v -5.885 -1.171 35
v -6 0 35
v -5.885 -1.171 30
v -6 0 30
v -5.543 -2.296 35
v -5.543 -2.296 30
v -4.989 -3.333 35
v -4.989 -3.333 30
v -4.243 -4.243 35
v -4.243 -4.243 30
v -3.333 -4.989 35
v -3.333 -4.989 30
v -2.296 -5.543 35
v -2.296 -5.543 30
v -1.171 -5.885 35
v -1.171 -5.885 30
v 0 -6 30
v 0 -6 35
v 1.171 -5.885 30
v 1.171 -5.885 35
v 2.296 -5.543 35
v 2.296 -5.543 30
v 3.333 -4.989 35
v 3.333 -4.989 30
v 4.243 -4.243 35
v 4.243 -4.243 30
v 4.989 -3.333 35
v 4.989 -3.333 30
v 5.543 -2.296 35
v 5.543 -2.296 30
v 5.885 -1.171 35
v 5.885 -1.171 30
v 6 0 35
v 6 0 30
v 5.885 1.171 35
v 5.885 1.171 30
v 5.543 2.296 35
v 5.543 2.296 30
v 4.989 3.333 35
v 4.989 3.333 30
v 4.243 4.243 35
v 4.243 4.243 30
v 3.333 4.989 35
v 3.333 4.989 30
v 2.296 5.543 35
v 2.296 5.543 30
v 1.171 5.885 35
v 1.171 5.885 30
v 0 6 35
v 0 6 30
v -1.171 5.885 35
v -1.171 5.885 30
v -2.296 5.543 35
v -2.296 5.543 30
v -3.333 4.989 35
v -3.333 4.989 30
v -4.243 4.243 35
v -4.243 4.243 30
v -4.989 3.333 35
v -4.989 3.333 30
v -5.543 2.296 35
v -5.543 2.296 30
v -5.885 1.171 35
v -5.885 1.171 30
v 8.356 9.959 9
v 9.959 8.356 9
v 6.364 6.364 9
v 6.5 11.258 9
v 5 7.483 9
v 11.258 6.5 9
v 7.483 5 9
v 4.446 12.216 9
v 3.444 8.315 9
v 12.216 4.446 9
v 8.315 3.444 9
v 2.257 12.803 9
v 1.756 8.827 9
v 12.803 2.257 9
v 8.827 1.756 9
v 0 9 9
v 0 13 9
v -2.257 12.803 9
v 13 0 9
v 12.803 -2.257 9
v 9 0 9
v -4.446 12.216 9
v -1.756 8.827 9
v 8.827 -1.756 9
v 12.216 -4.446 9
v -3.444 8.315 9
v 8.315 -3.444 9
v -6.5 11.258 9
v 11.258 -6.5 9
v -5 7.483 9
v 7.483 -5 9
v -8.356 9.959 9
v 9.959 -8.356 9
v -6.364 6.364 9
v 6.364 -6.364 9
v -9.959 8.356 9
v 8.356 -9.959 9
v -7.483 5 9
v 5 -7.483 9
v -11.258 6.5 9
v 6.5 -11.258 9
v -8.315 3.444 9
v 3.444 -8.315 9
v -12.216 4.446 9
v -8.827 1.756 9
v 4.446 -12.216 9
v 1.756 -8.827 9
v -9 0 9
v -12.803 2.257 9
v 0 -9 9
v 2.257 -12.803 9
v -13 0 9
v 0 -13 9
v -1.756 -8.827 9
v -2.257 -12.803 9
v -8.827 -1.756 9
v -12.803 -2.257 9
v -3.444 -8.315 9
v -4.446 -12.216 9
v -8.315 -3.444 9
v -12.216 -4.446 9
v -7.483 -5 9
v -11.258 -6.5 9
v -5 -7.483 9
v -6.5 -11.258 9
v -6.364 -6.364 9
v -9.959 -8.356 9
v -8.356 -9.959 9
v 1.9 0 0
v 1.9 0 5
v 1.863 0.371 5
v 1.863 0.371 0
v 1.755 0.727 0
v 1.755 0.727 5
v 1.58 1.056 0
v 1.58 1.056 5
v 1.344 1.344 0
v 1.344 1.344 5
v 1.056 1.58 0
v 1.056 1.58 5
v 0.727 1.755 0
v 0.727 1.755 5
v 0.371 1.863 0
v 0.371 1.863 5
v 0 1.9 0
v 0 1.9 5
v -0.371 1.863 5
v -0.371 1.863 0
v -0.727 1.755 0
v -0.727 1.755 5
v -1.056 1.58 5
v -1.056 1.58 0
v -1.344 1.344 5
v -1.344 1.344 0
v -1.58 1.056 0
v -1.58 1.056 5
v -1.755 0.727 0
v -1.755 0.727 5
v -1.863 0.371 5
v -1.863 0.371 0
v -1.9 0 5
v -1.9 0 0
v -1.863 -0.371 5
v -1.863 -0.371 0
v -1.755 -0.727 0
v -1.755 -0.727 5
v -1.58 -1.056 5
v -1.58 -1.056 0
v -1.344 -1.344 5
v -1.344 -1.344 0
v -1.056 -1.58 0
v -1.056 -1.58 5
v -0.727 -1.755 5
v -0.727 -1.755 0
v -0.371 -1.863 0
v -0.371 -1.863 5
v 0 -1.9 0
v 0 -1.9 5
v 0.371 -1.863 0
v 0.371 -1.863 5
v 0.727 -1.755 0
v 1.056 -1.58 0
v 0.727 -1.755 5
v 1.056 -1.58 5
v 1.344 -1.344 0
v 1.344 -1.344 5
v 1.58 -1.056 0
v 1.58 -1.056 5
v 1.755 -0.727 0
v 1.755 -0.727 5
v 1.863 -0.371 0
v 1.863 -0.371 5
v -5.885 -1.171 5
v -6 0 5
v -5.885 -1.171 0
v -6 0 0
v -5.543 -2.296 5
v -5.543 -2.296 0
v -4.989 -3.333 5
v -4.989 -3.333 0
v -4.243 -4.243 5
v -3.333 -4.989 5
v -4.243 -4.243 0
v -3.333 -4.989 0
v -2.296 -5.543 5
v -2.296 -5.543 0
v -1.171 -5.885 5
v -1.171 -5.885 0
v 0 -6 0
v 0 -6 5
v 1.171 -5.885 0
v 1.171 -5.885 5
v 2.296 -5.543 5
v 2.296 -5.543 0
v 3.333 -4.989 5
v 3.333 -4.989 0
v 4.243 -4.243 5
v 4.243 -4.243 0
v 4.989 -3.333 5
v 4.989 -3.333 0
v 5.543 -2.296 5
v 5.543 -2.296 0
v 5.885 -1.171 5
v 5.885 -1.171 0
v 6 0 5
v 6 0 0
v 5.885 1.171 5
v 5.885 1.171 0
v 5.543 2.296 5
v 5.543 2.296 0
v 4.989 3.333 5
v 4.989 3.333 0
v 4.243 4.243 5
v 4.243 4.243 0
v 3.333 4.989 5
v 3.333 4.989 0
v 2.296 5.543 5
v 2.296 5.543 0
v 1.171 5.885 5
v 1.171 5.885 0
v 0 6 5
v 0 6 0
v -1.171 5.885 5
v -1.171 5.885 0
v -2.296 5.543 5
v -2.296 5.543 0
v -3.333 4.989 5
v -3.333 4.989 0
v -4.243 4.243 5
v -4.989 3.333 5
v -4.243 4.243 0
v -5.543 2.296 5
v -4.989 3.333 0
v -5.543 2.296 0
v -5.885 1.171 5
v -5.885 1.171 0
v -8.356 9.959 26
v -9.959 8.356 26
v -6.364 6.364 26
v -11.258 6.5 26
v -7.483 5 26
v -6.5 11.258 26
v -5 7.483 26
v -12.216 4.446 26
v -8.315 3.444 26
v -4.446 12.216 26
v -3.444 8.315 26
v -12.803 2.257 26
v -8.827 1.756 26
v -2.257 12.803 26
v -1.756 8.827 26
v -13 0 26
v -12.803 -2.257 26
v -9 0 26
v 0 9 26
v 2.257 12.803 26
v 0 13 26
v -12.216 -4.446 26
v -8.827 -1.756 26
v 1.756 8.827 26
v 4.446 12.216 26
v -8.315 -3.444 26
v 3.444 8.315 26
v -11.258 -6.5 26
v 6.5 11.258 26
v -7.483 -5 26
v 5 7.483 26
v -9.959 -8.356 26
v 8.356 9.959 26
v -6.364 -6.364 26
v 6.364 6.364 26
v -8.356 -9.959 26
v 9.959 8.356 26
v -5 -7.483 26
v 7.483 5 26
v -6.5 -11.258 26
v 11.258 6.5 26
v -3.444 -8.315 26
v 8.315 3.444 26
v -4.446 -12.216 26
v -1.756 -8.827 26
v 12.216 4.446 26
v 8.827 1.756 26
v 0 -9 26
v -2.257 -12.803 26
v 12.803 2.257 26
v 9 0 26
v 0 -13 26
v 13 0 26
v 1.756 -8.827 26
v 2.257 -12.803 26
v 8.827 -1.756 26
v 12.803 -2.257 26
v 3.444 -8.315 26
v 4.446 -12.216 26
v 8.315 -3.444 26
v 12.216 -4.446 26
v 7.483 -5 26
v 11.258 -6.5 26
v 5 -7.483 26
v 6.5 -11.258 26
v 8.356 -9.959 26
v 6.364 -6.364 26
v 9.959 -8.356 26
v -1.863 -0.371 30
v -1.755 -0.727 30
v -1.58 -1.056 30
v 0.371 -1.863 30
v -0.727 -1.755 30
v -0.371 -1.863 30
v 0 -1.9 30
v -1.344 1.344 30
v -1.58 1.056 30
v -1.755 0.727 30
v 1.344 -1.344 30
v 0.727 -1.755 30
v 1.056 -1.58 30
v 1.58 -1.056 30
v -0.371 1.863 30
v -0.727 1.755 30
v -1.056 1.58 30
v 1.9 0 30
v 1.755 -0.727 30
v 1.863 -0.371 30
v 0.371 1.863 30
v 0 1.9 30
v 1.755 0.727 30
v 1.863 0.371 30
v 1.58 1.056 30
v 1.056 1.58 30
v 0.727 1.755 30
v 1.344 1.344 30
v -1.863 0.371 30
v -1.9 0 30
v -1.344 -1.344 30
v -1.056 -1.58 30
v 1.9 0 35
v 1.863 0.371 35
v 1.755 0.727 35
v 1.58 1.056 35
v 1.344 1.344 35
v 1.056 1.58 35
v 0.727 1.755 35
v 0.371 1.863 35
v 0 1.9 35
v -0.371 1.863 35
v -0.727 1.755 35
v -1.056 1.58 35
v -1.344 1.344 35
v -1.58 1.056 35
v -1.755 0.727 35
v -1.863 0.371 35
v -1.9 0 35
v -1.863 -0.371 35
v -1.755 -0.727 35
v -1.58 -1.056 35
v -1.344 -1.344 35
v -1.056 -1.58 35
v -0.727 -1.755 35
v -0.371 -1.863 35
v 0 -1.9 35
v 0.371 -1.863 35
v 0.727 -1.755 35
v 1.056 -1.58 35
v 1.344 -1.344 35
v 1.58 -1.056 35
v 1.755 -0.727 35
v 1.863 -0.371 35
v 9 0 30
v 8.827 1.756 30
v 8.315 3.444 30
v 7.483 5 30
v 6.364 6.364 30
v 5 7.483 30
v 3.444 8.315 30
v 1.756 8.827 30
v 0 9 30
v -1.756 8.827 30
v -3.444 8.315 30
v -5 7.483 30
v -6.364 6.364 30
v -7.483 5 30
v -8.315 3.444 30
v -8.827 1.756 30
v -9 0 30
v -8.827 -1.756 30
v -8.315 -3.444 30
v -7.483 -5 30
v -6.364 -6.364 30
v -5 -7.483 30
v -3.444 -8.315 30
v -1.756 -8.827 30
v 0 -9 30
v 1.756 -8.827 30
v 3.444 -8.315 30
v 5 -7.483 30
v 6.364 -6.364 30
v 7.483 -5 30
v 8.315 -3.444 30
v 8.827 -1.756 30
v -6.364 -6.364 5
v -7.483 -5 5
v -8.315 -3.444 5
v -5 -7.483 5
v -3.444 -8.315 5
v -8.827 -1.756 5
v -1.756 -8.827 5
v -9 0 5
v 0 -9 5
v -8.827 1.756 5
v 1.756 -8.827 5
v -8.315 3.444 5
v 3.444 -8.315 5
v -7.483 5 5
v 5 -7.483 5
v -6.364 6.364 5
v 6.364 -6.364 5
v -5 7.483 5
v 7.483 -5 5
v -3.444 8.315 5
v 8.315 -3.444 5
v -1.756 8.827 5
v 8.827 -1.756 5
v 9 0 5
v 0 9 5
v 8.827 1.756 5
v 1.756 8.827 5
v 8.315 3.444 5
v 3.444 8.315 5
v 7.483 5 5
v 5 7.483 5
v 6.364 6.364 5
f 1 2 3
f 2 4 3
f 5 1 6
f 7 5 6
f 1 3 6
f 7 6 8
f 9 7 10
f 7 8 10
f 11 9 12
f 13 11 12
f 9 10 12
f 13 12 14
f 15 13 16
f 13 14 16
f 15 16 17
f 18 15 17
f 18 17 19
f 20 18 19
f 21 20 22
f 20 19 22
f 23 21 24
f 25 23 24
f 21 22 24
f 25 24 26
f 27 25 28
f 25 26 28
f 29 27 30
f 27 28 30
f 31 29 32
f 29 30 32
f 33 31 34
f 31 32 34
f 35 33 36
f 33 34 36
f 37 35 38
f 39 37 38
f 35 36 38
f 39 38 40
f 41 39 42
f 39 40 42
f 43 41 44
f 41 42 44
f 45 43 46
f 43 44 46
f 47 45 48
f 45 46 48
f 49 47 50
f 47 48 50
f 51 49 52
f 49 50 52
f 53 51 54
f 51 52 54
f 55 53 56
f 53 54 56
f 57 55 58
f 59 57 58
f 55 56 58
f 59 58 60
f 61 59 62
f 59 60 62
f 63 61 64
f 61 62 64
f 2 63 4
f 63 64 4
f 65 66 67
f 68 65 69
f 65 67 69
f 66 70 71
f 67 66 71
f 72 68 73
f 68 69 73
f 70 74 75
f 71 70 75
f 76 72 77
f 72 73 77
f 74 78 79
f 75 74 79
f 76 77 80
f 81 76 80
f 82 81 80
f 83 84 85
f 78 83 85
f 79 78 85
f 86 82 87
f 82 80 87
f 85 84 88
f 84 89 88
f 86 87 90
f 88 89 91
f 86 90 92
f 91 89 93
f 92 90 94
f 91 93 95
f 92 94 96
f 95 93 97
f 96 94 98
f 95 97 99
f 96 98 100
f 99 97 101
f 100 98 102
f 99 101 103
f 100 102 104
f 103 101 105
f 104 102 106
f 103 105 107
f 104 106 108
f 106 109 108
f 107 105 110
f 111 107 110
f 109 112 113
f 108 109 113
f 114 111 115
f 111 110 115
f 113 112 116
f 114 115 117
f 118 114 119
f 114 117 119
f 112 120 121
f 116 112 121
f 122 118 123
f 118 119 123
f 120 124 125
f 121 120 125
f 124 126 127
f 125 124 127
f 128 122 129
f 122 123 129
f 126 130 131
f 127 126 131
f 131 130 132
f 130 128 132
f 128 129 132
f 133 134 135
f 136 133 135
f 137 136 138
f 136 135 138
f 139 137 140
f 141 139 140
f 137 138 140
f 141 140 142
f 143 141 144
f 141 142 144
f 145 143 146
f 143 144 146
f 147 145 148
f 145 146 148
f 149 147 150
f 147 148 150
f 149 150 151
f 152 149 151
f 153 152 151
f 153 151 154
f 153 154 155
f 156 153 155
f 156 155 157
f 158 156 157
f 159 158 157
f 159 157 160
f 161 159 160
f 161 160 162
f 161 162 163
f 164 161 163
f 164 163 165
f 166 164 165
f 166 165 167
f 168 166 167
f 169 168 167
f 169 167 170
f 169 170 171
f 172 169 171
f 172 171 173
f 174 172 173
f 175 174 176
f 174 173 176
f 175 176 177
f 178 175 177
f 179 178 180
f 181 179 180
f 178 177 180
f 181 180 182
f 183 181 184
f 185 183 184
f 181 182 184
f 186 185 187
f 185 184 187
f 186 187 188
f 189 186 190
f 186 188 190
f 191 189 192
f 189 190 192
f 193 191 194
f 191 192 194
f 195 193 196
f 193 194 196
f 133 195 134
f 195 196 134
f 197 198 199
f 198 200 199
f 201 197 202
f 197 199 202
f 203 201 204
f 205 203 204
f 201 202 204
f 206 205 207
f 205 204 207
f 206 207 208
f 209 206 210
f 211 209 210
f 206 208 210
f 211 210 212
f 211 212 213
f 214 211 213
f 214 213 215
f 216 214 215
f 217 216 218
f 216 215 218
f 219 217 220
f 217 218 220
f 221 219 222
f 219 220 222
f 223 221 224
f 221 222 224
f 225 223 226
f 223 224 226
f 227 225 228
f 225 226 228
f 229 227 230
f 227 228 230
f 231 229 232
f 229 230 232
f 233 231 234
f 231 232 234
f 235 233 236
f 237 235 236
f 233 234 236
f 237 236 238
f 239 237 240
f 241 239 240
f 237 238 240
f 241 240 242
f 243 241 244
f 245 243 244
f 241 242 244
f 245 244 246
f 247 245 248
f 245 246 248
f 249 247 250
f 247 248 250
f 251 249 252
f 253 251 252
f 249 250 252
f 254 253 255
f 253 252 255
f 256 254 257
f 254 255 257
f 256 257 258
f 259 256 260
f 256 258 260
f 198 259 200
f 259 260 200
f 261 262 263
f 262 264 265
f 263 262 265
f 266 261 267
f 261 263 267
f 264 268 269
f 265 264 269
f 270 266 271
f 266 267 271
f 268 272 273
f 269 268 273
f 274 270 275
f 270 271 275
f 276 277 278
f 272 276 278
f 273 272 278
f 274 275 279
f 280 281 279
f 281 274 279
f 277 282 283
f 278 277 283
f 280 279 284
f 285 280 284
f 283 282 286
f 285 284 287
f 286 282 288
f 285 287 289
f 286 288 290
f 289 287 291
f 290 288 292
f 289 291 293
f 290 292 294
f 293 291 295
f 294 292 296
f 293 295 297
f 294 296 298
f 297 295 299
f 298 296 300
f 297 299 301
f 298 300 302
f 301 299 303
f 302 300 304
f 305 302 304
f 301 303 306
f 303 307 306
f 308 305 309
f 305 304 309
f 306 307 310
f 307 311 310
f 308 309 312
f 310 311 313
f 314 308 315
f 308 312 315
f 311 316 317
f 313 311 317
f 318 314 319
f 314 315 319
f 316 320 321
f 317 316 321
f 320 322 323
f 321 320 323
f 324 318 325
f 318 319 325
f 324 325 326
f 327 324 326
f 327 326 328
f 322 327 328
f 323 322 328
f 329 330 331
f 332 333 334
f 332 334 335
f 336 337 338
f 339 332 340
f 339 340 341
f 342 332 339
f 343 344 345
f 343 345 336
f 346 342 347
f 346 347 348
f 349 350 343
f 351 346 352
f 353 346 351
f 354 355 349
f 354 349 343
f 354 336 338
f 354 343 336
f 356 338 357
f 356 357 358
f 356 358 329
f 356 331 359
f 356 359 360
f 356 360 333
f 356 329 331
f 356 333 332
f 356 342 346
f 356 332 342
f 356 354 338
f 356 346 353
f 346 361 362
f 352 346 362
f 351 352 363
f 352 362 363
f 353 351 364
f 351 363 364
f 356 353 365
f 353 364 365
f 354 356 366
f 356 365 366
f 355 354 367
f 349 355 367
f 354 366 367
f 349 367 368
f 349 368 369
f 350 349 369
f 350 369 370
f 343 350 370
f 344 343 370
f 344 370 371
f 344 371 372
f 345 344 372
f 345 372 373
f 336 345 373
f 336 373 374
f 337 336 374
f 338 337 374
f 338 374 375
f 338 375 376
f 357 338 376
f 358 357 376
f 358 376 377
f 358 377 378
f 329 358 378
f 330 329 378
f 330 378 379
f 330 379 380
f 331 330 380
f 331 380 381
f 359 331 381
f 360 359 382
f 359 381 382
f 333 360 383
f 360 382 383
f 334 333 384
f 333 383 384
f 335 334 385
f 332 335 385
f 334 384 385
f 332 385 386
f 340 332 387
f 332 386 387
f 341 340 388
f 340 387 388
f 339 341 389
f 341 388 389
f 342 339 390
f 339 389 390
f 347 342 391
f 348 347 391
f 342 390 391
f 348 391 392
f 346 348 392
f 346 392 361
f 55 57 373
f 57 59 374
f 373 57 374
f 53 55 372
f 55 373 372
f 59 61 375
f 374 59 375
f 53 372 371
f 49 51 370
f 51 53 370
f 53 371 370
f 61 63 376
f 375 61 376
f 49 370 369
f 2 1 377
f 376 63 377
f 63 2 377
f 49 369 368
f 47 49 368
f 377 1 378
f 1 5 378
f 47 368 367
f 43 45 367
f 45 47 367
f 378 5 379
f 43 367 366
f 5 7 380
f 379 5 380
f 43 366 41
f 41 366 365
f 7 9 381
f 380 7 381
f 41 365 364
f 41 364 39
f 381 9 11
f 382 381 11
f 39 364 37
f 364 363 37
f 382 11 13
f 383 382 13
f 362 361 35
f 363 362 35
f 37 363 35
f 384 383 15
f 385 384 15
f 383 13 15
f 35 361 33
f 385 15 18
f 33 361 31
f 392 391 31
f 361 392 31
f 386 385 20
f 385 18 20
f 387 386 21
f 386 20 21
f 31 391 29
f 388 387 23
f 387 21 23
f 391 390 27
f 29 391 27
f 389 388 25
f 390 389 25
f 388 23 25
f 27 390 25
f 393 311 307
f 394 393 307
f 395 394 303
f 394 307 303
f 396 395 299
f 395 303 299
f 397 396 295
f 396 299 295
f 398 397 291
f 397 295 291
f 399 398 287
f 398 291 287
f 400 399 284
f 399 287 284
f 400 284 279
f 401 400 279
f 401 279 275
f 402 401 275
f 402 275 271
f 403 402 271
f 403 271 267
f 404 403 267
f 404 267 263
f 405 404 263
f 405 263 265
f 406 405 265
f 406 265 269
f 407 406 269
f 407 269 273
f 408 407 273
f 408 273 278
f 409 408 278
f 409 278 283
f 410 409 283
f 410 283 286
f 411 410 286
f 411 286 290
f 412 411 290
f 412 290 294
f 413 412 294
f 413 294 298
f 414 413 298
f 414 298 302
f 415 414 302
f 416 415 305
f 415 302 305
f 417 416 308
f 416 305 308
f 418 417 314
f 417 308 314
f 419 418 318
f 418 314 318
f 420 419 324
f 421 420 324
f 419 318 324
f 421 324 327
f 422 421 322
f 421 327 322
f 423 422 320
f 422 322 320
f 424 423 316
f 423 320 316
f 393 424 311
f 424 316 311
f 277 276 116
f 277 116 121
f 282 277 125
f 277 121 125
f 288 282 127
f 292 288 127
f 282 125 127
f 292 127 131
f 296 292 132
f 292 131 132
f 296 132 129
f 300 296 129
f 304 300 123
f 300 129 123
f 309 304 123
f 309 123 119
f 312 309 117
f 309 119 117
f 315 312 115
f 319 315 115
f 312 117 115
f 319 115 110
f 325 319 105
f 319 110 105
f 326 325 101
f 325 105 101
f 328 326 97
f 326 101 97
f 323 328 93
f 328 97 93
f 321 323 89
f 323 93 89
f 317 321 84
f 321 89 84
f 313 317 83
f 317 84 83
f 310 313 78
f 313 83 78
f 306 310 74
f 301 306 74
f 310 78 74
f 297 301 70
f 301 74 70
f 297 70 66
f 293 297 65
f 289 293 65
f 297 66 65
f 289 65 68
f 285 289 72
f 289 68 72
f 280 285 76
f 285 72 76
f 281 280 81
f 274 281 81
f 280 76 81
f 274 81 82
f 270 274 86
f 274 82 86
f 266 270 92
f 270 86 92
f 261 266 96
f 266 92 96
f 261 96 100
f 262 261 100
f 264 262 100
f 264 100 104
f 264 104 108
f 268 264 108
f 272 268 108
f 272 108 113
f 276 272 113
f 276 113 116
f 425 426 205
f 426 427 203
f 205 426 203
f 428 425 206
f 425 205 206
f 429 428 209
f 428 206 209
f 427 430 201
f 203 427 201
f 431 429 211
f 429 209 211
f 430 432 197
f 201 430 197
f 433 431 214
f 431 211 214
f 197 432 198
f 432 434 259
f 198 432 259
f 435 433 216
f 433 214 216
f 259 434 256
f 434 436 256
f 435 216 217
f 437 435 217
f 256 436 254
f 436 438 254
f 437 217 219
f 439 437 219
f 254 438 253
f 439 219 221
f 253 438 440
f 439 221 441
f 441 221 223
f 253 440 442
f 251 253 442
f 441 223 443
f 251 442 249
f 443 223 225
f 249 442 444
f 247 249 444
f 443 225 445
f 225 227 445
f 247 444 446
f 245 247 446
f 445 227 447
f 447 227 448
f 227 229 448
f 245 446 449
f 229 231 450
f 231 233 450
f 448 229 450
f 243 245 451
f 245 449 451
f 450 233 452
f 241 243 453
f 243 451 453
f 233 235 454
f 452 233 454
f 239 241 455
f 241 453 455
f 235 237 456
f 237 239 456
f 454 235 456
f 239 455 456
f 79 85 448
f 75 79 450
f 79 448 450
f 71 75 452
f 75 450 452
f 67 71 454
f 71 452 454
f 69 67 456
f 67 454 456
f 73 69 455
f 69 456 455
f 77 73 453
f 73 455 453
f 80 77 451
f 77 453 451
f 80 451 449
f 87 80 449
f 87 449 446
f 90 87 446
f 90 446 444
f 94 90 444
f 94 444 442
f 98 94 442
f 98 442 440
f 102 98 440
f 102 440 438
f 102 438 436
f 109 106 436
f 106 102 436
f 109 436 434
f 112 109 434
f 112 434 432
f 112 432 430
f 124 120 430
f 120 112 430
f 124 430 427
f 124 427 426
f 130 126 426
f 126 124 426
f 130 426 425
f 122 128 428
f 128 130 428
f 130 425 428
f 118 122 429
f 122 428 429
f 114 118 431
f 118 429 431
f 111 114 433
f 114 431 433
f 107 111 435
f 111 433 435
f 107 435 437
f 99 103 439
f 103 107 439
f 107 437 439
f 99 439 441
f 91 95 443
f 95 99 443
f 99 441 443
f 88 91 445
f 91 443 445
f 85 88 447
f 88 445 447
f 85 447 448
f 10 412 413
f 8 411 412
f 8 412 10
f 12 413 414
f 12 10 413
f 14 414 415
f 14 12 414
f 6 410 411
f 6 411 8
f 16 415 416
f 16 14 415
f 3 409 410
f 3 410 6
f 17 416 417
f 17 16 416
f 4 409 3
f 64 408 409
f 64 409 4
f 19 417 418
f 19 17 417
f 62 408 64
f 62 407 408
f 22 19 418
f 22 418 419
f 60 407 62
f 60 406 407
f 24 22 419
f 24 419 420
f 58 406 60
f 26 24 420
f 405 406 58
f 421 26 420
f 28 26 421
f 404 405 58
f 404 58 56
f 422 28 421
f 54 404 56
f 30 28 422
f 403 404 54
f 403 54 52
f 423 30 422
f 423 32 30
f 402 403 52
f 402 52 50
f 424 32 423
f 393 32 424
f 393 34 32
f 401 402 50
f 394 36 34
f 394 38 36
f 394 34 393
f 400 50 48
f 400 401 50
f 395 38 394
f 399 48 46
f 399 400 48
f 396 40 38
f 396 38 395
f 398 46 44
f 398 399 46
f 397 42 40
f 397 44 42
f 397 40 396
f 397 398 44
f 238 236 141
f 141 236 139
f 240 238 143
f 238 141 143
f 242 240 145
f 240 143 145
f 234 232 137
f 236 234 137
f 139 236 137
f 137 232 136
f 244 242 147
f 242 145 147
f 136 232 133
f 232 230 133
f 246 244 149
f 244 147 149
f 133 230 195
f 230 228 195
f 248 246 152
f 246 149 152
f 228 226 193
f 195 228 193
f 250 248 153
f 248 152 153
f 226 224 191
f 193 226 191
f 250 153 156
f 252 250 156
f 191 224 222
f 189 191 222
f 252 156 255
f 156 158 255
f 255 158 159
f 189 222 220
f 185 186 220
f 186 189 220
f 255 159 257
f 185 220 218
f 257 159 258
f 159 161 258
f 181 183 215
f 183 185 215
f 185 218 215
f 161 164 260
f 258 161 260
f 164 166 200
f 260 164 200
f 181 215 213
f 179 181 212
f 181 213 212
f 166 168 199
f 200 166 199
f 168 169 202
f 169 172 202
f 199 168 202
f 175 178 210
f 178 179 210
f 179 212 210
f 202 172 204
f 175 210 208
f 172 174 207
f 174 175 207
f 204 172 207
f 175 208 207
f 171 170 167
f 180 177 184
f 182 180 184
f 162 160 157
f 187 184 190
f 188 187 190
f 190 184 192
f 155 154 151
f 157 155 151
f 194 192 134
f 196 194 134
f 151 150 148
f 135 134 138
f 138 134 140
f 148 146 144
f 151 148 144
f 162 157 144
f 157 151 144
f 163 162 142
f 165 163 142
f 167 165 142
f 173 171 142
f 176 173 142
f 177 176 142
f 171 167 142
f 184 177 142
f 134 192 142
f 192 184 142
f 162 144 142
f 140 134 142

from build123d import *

# Parameters (mm, degrees)
SKETCH_2_R           = 1.9
CUT_EXTRUDE_1_DEPTH  = 36
EXTRUDE_1_DEPTH      = 4
EXTRUDE_1_DEPTH_BACK = 21
SKETCH_4_R           = 9


with BuildPart() as part:
    # 草图1 → 旋转1 (revolve)
    with BuildSketch(Plane(origin=(0, 0, 0), x_dir=(1, 0, 0), z_dir=(0, 1, 0)), mode=Mode.PRIVATE) as revolve_1_sk:
        Polygon((0, -1e-09), (0, -35), (6, -35), (6, -30), (7.5, -30), (7.5, -26), (9, -26), (13, -26), (13, -9), (9, -9), (7.5, -9), (7.5, -5), (6, -5), (6, -1e-09), align=None)
    revolve(revolve_1_sk.sketch.rotate(Axis((0, 0, 1e-09), (0, 0, 1)), 180), axis=Axis((0, 0, 1e-09), (0, 0, 1)))

    # 草图2 → 切除-拉伸1 (cut)
    with BuildSketch(Plane.XY.offset(35)):
        Circle(SKETCH_2_R)
    extrude(amount=-CUT_EXTRUDE_1_DEPTH, mode=Mode.SUBTRACT)

    # 草图4 → 凸台-拉伸1 (add, two sides: drawn at the far end of the back side and taken through both)
    with BuildSketch(Plane.XY.offset(26).offset(-EXTRUDE_1_DEPTH_BACK)):
        Circle(SKETCH_4_R)
    extrude(amount=EXTRUDE_1_DEPTH + EXTRUDE_1_DEPTH_BACK)


solid = part.part
